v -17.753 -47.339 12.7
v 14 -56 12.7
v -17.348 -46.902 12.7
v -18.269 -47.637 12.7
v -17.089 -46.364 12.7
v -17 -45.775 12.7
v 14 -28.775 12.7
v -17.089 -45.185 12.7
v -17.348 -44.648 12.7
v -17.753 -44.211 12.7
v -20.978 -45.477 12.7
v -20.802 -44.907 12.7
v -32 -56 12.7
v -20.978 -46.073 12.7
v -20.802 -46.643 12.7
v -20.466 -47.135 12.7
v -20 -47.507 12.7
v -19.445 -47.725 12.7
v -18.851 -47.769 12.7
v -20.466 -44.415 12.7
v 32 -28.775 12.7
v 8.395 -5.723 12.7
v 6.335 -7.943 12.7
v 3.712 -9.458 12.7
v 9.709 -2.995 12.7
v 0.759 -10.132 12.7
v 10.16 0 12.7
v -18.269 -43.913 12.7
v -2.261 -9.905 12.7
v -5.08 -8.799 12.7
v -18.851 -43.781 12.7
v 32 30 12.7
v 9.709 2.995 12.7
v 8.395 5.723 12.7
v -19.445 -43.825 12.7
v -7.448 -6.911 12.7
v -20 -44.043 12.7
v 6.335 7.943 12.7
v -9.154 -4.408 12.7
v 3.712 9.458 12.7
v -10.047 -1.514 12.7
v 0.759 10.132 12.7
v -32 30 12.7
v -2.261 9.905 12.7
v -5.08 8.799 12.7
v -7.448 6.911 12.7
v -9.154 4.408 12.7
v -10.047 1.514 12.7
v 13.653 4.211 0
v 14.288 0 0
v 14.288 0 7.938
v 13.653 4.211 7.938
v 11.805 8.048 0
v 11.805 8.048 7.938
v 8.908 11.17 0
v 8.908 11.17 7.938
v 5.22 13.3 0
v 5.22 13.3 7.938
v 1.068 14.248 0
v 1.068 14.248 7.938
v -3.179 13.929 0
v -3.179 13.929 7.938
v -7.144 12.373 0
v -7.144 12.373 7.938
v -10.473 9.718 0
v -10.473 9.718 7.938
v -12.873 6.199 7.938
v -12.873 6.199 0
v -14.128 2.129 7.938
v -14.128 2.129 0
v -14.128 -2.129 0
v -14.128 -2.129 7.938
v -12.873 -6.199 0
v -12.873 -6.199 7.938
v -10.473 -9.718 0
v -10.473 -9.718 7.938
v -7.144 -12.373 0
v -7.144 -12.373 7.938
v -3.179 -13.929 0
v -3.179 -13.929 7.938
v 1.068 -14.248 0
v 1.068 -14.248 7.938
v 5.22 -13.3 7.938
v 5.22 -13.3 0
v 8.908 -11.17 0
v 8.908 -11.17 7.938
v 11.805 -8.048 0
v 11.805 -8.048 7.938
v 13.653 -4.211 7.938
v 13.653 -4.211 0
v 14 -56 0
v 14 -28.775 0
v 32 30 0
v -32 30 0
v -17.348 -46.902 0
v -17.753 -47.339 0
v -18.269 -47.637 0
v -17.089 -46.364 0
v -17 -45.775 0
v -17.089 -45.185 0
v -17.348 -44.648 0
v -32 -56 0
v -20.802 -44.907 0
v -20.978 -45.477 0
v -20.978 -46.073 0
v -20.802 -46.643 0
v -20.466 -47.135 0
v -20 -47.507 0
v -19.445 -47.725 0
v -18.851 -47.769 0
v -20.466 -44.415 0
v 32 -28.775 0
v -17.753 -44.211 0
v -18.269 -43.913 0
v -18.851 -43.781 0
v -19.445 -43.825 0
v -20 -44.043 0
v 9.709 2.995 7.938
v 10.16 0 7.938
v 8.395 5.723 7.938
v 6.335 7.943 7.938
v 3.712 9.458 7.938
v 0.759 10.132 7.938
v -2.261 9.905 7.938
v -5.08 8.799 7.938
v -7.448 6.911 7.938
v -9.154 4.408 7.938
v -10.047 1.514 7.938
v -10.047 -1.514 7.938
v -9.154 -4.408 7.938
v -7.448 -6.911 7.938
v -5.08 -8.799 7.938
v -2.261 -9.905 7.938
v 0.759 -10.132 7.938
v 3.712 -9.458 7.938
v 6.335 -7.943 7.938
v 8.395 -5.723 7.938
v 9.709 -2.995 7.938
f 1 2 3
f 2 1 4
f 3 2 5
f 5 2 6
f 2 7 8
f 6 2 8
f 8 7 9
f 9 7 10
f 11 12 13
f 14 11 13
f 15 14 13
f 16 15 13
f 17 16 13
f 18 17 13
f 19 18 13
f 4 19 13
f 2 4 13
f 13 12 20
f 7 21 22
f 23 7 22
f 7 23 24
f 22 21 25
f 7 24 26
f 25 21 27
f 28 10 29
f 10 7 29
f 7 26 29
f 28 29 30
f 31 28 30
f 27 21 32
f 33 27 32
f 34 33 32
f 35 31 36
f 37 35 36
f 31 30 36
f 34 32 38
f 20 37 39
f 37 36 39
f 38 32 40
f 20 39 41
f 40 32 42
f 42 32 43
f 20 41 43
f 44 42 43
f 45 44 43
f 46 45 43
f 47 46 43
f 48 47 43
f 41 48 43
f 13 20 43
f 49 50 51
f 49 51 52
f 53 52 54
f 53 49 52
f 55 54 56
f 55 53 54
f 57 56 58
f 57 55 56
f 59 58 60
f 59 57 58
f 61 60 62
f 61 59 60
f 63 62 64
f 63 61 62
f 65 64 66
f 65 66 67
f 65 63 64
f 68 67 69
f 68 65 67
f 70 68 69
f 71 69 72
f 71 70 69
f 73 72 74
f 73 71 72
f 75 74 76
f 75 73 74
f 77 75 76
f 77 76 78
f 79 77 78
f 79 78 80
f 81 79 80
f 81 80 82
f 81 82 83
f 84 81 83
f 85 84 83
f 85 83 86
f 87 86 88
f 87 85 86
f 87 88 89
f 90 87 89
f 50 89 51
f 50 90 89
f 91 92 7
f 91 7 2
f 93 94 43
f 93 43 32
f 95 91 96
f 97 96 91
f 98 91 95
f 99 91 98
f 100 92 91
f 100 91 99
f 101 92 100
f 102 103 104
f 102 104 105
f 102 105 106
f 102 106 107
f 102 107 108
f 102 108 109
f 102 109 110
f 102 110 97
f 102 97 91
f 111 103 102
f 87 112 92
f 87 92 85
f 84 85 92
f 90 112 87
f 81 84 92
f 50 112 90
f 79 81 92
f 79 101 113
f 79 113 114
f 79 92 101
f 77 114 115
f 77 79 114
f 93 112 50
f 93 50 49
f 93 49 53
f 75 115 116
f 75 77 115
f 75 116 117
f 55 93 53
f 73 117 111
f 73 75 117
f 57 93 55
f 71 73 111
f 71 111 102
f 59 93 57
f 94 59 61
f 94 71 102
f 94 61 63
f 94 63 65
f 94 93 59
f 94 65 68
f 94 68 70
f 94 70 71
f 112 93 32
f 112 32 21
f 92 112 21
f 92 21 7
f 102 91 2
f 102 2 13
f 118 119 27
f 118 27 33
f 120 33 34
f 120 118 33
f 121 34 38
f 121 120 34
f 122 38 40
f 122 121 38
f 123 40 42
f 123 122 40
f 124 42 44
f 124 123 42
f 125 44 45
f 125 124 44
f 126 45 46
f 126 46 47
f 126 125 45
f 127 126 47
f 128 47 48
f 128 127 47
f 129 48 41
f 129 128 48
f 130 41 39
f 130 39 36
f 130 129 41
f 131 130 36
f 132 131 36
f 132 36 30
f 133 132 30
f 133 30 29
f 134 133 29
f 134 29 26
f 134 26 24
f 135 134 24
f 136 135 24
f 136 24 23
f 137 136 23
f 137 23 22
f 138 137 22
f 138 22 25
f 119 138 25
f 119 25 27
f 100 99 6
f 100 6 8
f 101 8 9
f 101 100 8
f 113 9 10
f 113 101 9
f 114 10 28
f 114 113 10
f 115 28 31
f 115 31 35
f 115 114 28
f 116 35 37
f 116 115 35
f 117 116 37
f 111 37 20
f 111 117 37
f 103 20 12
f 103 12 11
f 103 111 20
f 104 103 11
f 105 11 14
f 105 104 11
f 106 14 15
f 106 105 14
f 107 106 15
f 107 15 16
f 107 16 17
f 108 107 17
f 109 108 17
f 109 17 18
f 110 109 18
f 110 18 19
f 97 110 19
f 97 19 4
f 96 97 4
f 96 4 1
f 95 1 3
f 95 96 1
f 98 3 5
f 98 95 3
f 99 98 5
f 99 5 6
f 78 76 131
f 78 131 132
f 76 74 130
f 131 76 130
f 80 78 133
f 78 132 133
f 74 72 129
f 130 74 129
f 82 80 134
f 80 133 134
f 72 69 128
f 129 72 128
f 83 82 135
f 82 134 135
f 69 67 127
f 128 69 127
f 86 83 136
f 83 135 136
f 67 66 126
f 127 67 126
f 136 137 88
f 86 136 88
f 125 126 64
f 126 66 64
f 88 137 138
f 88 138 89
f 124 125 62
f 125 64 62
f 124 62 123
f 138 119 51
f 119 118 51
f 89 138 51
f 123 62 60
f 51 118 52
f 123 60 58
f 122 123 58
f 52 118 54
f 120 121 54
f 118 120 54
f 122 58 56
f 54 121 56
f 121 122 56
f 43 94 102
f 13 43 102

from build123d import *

# Parameters (mm, degrees)
SKETCH1_R           = 10.16
SKETCH1_R_2         = 2
BOSS_EXTRUDE1_DEPTH = 12.7
SKETCH2_R           = 14.2875
CUT_EXTRUDE1_DEPTH  = 7.9375


with BuildPart() as part:
    # Sketch1 → Boss-Extrude1 (new body)
    with BuildSketch(Plane.XY):
        Polygon((14, -56), (-32, -56), (-32, 0), (-32, 30), (32, 30), (32, -28.77498914), (14, -28.77498914), align=None)
        Circle(SKETCH1_R, mode=Mode.SUBTRACT)
        with Locations((-19, -45.77498914)):
            Circle(SKETCH1_R_2, mode=Mode.SUBTRACT)
    extrude(amount=BOSS_EXTRUDE1_DEPTH)

    # Sketch2 → Cut-Extrude1 (cut)
    with BuildSketch(Plane.XY):
        Circle(SKETCH2_R)
    extrude(amount=CUT_EXTRUDE1_DEPTH, mode=Mode.SUBTRACT)


solid = part.part
